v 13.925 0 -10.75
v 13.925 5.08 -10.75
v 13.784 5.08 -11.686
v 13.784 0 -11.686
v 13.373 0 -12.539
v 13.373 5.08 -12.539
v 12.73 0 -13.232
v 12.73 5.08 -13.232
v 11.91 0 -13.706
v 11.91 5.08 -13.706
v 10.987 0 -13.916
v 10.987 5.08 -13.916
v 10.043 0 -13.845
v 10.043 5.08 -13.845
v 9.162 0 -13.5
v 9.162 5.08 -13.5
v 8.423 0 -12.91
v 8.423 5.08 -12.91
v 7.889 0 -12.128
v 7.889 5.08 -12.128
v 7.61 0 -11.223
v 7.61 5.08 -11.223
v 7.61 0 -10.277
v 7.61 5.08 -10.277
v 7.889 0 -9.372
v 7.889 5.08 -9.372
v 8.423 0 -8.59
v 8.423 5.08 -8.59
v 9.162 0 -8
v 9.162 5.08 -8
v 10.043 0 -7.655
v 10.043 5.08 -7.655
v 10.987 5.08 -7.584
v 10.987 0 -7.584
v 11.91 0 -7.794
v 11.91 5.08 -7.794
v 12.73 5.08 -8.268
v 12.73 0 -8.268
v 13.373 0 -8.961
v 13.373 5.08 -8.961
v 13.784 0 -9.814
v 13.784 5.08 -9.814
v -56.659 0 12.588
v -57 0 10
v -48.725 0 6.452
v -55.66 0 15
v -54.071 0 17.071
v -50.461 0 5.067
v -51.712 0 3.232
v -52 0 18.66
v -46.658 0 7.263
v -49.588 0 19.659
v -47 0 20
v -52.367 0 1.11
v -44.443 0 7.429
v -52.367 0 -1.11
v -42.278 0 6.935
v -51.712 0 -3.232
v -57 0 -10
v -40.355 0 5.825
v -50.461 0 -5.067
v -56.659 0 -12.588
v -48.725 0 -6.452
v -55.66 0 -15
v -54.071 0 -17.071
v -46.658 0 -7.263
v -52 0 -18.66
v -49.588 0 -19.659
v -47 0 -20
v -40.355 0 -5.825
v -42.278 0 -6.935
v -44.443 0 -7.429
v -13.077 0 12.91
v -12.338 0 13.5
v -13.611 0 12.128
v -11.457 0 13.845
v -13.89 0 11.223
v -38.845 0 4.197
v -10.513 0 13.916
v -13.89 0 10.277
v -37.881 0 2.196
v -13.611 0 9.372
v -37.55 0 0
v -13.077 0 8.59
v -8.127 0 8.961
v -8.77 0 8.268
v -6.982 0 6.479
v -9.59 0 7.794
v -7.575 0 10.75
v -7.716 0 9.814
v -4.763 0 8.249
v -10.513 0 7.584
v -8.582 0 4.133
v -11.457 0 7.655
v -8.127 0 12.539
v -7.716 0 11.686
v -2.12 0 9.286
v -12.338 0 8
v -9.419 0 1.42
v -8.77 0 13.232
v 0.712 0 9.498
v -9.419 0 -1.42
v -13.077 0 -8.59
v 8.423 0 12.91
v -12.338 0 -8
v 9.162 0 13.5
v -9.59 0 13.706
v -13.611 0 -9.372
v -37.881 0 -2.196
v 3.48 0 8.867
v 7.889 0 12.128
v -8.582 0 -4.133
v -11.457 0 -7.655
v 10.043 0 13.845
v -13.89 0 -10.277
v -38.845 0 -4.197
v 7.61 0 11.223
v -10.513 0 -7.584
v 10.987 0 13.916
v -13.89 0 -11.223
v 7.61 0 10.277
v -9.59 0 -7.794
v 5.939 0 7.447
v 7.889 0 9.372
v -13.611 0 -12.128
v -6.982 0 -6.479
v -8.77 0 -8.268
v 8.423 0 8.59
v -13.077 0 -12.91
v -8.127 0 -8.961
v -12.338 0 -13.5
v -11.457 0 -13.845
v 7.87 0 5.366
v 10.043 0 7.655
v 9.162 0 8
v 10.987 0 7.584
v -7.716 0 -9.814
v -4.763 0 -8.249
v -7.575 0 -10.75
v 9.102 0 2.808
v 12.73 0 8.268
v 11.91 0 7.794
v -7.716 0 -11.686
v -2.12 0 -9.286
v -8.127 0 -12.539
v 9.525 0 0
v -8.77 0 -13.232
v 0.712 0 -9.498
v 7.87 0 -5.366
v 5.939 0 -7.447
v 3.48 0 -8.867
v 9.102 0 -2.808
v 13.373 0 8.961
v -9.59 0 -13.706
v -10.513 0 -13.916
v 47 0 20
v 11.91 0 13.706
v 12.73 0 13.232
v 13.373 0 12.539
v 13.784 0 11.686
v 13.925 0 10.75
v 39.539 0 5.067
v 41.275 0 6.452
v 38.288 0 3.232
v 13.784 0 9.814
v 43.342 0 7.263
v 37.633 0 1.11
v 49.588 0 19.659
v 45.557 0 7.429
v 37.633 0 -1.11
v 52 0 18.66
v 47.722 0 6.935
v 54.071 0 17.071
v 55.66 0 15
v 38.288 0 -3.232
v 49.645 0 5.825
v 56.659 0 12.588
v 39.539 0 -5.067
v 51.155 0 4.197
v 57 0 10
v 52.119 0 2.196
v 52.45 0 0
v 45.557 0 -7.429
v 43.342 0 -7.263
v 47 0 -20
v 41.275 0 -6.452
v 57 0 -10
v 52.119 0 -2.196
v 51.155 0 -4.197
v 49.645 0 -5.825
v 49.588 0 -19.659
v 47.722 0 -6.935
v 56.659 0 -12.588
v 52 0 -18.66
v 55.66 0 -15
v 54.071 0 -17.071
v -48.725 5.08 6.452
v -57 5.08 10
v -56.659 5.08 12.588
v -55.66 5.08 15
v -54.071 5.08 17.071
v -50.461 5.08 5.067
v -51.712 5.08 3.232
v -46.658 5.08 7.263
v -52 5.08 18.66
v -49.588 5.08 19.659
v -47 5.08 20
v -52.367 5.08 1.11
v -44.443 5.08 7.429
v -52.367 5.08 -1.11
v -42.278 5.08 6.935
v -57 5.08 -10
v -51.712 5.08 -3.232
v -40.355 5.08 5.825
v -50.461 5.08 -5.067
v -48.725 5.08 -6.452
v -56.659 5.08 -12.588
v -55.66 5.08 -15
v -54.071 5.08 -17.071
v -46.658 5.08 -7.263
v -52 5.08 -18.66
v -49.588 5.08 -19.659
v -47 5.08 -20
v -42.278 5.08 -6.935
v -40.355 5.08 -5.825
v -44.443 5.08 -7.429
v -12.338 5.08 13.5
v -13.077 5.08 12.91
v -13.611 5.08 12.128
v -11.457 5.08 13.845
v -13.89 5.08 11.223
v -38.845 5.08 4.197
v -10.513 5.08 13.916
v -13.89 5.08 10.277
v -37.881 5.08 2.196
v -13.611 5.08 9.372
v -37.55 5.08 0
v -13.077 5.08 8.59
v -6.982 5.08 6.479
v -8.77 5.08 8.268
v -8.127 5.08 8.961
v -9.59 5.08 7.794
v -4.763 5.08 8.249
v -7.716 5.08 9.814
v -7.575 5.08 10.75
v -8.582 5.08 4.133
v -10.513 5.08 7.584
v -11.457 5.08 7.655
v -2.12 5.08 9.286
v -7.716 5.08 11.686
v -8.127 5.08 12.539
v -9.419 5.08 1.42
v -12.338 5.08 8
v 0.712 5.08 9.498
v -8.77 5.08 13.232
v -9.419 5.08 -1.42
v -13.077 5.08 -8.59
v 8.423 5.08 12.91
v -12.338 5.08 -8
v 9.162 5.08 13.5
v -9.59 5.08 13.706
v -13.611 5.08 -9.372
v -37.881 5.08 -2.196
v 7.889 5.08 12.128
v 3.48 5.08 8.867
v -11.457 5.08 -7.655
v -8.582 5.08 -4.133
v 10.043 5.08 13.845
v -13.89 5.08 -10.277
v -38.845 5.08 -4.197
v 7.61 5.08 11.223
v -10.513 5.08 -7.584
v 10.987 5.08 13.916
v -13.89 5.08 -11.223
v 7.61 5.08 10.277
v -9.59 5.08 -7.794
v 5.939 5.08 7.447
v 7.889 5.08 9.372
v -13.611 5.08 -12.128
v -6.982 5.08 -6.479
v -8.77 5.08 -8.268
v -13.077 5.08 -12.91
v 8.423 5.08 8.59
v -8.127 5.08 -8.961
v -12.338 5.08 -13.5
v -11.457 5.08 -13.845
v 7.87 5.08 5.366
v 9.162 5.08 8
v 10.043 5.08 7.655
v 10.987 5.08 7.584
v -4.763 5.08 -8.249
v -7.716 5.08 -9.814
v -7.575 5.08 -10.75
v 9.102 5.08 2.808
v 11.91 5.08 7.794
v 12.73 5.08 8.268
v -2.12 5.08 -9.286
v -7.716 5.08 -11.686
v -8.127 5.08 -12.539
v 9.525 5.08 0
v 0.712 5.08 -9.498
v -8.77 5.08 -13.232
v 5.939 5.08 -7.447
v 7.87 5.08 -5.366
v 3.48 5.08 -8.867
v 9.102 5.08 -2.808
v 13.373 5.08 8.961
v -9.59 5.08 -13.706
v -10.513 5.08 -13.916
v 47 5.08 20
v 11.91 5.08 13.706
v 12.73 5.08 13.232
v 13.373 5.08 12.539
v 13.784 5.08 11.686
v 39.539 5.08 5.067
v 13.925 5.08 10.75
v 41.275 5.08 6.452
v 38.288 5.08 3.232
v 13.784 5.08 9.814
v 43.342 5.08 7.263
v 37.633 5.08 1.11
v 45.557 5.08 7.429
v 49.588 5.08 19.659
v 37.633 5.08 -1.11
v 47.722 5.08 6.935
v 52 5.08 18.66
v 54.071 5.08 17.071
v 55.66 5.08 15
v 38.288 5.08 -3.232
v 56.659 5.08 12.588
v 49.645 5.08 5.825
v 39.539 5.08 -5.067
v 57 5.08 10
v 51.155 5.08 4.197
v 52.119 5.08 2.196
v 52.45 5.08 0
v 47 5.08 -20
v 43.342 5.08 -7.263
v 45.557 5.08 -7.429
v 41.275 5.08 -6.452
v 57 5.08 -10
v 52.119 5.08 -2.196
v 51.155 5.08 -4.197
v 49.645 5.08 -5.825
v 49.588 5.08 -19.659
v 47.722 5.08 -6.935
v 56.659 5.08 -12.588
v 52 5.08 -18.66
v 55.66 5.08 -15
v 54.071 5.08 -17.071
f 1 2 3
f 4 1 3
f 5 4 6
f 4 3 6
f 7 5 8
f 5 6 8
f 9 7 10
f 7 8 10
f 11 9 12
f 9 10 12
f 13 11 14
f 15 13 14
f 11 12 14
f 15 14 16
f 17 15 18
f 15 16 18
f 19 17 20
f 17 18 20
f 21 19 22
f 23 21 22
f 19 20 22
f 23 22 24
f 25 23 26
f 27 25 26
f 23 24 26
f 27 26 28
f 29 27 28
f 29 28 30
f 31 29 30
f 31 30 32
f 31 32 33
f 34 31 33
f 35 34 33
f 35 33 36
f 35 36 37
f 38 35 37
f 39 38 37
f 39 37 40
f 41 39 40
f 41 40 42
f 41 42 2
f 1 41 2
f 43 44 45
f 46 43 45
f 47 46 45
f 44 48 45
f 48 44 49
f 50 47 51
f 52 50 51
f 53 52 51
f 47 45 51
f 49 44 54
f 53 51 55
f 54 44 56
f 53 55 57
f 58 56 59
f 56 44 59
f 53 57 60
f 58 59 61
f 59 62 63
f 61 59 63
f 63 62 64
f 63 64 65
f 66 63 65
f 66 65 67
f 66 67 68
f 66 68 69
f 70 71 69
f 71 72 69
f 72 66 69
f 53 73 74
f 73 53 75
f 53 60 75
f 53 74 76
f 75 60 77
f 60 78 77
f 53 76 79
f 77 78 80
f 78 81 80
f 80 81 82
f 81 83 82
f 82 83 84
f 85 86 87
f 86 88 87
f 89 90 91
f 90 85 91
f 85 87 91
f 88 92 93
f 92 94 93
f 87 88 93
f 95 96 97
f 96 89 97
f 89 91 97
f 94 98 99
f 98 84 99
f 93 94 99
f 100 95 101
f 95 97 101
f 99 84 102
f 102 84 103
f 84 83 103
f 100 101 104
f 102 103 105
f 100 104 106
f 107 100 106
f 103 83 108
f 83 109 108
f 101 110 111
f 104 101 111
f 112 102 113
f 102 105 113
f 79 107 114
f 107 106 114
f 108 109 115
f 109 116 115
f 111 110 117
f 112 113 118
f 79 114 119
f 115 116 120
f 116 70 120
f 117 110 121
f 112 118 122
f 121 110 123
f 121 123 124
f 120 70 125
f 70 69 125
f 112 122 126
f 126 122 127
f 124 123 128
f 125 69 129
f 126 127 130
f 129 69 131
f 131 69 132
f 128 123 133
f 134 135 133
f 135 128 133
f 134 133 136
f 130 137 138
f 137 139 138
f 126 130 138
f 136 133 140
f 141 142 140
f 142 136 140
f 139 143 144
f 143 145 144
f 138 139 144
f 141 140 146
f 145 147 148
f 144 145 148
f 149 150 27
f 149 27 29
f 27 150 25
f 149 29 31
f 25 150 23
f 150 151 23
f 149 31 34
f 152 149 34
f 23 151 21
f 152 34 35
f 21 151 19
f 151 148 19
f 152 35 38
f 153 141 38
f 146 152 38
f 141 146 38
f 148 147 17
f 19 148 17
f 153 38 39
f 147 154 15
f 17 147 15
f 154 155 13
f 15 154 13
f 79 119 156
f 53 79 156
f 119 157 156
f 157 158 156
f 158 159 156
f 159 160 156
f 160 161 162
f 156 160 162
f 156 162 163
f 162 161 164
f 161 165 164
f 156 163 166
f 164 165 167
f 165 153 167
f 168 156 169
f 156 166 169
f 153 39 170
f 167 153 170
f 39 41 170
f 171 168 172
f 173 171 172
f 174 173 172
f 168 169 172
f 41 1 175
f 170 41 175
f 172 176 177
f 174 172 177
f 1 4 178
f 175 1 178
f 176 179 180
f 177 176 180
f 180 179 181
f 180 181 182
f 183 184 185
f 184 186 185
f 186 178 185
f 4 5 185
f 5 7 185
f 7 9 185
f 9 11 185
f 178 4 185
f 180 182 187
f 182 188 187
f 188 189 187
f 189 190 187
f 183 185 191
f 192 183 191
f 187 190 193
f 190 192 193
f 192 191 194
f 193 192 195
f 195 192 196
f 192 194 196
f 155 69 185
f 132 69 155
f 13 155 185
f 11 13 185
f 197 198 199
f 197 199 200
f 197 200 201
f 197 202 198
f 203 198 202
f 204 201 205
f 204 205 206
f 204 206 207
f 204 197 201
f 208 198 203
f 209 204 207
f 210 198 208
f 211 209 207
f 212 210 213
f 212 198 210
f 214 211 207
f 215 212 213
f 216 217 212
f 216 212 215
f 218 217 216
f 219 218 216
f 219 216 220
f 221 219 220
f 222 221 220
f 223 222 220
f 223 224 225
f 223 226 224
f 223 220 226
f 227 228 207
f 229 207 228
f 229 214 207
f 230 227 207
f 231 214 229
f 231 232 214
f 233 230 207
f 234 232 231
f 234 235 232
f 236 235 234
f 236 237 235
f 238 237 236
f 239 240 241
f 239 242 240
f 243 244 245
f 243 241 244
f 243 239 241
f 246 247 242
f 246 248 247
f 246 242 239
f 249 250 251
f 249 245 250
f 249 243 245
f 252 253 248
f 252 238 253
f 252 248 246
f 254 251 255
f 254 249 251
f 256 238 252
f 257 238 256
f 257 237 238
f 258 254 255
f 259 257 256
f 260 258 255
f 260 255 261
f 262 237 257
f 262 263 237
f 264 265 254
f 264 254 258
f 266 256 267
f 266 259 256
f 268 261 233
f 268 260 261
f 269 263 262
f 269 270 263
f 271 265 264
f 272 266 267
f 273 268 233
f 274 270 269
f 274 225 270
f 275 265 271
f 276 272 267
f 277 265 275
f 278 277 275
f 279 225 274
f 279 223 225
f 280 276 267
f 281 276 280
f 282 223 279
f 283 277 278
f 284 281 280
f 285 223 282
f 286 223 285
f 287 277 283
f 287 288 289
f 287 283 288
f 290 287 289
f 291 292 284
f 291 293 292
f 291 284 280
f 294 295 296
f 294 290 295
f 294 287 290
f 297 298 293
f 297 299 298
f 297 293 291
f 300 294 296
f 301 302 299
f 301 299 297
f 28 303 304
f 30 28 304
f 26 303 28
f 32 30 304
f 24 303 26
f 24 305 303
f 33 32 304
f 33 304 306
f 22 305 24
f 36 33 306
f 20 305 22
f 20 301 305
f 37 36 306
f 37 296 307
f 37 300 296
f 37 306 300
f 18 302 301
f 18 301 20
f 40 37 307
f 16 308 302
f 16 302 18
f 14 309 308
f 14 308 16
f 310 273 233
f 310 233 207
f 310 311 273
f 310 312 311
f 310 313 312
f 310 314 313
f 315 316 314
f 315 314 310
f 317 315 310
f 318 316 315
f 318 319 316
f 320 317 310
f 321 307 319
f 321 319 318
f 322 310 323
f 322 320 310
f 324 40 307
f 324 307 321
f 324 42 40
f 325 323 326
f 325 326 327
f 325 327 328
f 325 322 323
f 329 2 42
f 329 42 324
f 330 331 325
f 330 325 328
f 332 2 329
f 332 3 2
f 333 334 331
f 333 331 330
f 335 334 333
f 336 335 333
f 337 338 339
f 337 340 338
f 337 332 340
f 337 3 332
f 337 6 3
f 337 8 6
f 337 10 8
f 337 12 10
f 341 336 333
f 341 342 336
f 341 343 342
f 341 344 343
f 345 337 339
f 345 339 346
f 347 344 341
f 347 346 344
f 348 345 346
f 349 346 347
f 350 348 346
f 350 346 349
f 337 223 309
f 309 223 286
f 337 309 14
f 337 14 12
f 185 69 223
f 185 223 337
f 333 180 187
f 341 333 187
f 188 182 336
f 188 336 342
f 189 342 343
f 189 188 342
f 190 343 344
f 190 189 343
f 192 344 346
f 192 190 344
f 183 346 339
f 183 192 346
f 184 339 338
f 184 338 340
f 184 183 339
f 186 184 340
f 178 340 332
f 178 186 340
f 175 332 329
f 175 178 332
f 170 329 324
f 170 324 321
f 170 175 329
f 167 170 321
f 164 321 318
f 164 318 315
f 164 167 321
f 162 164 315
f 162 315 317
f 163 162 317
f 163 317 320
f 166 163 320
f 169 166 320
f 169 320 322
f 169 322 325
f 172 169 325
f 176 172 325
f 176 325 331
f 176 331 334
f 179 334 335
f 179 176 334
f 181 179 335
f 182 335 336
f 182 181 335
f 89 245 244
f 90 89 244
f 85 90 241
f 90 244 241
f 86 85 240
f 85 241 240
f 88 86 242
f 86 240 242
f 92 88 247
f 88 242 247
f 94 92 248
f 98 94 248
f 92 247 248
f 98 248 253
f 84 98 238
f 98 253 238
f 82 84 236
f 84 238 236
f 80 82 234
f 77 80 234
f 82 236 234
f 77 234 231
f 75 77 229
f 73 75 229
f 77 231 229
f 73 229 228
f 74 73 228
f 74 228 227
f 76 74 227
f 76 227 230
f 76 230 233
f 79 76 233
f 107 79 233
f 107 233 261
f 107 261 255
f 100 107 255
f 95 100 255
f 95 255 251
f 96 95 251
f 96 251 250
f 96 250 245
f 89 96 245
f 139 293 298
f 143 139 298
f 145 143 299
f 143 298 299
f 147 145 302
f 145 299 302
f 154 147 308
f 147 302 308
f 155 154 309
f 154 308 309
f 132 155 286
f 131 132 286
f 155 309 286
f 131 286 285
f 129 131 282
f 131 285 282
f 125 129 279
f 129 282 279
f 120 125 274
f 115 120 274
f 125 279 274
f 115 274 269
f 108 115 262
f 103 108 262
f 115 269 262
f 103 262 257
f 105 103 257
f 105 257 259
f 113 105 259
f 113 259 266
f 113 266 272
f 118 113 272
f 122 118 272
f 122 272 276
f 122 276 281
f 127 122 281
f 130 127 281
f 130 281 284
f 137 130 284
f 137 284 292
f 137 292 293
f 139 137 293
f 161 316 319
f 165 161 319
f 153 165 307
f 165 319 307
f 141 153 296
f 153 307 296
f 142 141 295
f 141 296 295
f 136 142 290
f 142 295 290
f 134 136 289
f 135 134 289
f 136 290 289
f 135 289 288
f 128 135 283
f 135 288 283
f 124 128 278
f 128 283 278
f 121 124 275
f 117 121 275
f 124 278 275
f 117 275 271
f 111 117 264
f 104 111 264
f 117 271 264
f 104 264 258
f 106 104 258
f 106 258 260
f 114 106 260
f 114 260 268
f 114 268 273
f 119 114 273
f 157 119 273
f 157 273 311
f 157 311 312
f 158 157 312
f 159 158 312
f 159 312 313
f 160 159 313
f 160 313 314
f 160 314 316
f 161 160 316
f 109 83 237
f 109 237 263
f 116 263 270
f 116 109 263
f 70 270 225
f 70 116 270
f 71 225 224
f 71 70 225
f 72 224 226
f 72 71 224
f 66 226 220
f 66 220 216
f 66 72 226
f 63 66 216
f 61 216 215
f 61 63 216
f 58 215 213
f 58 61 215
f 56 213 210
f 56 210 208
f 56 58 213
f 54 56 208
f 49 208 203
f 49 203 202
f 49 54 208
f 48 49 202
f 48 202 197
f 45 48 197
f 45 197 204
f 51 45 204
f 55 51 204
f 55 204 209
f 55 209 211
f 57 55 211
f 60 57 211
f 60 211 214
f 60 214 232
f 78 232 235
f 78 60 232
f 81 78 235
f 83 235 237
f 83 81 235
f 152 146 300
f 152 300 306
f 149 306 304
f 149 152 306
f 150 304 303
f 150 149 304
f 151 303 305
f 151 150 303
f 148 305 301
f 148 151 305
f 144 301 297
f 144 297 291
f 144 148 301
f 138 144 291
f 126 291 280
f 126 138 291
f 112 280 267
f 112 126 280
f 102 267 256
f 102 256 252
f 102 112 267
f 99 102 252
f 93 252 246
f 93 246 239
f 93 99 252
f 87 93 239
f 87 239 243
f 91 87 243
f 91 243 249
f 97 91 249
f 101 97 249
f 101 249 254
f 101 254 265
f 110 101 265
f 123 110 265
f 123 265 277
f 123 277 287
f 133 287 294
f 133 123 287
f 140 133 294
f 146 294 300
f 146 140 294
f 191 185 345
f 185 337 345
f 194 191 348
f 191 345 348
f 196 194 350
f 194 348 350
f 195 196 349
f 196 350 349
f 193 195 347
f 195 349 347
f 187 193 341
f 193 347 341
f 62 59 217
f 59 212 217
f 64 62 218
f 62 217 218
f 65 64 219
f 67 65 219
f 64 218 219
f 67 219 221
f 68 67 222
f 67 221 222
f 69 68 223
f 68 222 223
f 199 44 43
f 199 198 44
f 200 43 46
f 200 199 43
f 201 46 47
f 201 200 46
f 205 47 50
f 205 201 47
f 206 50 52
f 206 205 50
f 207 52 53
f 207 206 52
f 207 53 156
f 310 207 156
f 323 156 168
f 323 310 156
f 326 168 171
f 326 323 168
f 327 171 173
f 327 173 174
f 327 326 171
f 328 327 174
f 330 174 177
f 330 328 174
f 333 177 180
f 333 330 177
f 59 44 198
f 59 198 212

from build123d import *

# Parameters (mm, degrees)
SKETCH1_W           = 114
SKETCH1_H           = 40
SKETCH1_R           = 7.45
SKETCH1_R_2         = 9.525
BOSS_EXTRUDE1_DEPTH = 5.08
FILLET1_R           = 10
SKETCH2_R           = 3.175
CUT_EXTRUDE1_DEPTH  = 6.08


with BuildPart() as part:
    # Sketch1 → Boss-Extrude1 (new body)
    with BuildSketch(Plane(origin=(0, 0, 0), x_dir=(1, 0, 0), z_dir=(0, 1, 0))):
        Rectangle(SKETCH1_W, SKETCH1_H)
        with Locations((-45, 0)):
            Circle(SKETCH1_R, mode=Mode.SUBTRACT)
        with Locations((45, 0)):
            Circle(SKETCH1_R, mode=Mode.SUBTRACT)
        Circle(SKETCH1_R_2, mode=Mode.SUBTRACT)
    extrude(amount=BOSS_EXTRUDE1_DEPTH)

    # Fillet1
    fillet1_edges = [part.edges().sort_by_distance(p)[0] for p in [
        (-57, 2.54, -20),
        (57, 2.54, -20),
        (57, 2.54, 20),
        (-57, 2.54, 20),
    ]]
    fillet(fillet1_edges, radius=FILLET1_R)

    # Sketch2 → Cut-Extrude1 (cut, through all)
    with BuildSketch(Plane(origin=(0, 5.08, 0), x_dir=(1, 0, 0), z_dir=(0, 1, 0))):
        with Locations((-10.75, -10.75)):
            Circle(SKETCH2_R)
        with Locations((-10.75, 10.75)):
            Circle(SKETCH2_R)
        with Locations((10.75, 10.75)):
            Circle(SKETCH2_R)
        with Locations((10.75, -10.75)):
            Circle(SKETCH2_R)
    extrude(amount=-CUT_EXTRUDE1_DEPTH, mode=Mode.SUBTRACT)


solid = part.part
